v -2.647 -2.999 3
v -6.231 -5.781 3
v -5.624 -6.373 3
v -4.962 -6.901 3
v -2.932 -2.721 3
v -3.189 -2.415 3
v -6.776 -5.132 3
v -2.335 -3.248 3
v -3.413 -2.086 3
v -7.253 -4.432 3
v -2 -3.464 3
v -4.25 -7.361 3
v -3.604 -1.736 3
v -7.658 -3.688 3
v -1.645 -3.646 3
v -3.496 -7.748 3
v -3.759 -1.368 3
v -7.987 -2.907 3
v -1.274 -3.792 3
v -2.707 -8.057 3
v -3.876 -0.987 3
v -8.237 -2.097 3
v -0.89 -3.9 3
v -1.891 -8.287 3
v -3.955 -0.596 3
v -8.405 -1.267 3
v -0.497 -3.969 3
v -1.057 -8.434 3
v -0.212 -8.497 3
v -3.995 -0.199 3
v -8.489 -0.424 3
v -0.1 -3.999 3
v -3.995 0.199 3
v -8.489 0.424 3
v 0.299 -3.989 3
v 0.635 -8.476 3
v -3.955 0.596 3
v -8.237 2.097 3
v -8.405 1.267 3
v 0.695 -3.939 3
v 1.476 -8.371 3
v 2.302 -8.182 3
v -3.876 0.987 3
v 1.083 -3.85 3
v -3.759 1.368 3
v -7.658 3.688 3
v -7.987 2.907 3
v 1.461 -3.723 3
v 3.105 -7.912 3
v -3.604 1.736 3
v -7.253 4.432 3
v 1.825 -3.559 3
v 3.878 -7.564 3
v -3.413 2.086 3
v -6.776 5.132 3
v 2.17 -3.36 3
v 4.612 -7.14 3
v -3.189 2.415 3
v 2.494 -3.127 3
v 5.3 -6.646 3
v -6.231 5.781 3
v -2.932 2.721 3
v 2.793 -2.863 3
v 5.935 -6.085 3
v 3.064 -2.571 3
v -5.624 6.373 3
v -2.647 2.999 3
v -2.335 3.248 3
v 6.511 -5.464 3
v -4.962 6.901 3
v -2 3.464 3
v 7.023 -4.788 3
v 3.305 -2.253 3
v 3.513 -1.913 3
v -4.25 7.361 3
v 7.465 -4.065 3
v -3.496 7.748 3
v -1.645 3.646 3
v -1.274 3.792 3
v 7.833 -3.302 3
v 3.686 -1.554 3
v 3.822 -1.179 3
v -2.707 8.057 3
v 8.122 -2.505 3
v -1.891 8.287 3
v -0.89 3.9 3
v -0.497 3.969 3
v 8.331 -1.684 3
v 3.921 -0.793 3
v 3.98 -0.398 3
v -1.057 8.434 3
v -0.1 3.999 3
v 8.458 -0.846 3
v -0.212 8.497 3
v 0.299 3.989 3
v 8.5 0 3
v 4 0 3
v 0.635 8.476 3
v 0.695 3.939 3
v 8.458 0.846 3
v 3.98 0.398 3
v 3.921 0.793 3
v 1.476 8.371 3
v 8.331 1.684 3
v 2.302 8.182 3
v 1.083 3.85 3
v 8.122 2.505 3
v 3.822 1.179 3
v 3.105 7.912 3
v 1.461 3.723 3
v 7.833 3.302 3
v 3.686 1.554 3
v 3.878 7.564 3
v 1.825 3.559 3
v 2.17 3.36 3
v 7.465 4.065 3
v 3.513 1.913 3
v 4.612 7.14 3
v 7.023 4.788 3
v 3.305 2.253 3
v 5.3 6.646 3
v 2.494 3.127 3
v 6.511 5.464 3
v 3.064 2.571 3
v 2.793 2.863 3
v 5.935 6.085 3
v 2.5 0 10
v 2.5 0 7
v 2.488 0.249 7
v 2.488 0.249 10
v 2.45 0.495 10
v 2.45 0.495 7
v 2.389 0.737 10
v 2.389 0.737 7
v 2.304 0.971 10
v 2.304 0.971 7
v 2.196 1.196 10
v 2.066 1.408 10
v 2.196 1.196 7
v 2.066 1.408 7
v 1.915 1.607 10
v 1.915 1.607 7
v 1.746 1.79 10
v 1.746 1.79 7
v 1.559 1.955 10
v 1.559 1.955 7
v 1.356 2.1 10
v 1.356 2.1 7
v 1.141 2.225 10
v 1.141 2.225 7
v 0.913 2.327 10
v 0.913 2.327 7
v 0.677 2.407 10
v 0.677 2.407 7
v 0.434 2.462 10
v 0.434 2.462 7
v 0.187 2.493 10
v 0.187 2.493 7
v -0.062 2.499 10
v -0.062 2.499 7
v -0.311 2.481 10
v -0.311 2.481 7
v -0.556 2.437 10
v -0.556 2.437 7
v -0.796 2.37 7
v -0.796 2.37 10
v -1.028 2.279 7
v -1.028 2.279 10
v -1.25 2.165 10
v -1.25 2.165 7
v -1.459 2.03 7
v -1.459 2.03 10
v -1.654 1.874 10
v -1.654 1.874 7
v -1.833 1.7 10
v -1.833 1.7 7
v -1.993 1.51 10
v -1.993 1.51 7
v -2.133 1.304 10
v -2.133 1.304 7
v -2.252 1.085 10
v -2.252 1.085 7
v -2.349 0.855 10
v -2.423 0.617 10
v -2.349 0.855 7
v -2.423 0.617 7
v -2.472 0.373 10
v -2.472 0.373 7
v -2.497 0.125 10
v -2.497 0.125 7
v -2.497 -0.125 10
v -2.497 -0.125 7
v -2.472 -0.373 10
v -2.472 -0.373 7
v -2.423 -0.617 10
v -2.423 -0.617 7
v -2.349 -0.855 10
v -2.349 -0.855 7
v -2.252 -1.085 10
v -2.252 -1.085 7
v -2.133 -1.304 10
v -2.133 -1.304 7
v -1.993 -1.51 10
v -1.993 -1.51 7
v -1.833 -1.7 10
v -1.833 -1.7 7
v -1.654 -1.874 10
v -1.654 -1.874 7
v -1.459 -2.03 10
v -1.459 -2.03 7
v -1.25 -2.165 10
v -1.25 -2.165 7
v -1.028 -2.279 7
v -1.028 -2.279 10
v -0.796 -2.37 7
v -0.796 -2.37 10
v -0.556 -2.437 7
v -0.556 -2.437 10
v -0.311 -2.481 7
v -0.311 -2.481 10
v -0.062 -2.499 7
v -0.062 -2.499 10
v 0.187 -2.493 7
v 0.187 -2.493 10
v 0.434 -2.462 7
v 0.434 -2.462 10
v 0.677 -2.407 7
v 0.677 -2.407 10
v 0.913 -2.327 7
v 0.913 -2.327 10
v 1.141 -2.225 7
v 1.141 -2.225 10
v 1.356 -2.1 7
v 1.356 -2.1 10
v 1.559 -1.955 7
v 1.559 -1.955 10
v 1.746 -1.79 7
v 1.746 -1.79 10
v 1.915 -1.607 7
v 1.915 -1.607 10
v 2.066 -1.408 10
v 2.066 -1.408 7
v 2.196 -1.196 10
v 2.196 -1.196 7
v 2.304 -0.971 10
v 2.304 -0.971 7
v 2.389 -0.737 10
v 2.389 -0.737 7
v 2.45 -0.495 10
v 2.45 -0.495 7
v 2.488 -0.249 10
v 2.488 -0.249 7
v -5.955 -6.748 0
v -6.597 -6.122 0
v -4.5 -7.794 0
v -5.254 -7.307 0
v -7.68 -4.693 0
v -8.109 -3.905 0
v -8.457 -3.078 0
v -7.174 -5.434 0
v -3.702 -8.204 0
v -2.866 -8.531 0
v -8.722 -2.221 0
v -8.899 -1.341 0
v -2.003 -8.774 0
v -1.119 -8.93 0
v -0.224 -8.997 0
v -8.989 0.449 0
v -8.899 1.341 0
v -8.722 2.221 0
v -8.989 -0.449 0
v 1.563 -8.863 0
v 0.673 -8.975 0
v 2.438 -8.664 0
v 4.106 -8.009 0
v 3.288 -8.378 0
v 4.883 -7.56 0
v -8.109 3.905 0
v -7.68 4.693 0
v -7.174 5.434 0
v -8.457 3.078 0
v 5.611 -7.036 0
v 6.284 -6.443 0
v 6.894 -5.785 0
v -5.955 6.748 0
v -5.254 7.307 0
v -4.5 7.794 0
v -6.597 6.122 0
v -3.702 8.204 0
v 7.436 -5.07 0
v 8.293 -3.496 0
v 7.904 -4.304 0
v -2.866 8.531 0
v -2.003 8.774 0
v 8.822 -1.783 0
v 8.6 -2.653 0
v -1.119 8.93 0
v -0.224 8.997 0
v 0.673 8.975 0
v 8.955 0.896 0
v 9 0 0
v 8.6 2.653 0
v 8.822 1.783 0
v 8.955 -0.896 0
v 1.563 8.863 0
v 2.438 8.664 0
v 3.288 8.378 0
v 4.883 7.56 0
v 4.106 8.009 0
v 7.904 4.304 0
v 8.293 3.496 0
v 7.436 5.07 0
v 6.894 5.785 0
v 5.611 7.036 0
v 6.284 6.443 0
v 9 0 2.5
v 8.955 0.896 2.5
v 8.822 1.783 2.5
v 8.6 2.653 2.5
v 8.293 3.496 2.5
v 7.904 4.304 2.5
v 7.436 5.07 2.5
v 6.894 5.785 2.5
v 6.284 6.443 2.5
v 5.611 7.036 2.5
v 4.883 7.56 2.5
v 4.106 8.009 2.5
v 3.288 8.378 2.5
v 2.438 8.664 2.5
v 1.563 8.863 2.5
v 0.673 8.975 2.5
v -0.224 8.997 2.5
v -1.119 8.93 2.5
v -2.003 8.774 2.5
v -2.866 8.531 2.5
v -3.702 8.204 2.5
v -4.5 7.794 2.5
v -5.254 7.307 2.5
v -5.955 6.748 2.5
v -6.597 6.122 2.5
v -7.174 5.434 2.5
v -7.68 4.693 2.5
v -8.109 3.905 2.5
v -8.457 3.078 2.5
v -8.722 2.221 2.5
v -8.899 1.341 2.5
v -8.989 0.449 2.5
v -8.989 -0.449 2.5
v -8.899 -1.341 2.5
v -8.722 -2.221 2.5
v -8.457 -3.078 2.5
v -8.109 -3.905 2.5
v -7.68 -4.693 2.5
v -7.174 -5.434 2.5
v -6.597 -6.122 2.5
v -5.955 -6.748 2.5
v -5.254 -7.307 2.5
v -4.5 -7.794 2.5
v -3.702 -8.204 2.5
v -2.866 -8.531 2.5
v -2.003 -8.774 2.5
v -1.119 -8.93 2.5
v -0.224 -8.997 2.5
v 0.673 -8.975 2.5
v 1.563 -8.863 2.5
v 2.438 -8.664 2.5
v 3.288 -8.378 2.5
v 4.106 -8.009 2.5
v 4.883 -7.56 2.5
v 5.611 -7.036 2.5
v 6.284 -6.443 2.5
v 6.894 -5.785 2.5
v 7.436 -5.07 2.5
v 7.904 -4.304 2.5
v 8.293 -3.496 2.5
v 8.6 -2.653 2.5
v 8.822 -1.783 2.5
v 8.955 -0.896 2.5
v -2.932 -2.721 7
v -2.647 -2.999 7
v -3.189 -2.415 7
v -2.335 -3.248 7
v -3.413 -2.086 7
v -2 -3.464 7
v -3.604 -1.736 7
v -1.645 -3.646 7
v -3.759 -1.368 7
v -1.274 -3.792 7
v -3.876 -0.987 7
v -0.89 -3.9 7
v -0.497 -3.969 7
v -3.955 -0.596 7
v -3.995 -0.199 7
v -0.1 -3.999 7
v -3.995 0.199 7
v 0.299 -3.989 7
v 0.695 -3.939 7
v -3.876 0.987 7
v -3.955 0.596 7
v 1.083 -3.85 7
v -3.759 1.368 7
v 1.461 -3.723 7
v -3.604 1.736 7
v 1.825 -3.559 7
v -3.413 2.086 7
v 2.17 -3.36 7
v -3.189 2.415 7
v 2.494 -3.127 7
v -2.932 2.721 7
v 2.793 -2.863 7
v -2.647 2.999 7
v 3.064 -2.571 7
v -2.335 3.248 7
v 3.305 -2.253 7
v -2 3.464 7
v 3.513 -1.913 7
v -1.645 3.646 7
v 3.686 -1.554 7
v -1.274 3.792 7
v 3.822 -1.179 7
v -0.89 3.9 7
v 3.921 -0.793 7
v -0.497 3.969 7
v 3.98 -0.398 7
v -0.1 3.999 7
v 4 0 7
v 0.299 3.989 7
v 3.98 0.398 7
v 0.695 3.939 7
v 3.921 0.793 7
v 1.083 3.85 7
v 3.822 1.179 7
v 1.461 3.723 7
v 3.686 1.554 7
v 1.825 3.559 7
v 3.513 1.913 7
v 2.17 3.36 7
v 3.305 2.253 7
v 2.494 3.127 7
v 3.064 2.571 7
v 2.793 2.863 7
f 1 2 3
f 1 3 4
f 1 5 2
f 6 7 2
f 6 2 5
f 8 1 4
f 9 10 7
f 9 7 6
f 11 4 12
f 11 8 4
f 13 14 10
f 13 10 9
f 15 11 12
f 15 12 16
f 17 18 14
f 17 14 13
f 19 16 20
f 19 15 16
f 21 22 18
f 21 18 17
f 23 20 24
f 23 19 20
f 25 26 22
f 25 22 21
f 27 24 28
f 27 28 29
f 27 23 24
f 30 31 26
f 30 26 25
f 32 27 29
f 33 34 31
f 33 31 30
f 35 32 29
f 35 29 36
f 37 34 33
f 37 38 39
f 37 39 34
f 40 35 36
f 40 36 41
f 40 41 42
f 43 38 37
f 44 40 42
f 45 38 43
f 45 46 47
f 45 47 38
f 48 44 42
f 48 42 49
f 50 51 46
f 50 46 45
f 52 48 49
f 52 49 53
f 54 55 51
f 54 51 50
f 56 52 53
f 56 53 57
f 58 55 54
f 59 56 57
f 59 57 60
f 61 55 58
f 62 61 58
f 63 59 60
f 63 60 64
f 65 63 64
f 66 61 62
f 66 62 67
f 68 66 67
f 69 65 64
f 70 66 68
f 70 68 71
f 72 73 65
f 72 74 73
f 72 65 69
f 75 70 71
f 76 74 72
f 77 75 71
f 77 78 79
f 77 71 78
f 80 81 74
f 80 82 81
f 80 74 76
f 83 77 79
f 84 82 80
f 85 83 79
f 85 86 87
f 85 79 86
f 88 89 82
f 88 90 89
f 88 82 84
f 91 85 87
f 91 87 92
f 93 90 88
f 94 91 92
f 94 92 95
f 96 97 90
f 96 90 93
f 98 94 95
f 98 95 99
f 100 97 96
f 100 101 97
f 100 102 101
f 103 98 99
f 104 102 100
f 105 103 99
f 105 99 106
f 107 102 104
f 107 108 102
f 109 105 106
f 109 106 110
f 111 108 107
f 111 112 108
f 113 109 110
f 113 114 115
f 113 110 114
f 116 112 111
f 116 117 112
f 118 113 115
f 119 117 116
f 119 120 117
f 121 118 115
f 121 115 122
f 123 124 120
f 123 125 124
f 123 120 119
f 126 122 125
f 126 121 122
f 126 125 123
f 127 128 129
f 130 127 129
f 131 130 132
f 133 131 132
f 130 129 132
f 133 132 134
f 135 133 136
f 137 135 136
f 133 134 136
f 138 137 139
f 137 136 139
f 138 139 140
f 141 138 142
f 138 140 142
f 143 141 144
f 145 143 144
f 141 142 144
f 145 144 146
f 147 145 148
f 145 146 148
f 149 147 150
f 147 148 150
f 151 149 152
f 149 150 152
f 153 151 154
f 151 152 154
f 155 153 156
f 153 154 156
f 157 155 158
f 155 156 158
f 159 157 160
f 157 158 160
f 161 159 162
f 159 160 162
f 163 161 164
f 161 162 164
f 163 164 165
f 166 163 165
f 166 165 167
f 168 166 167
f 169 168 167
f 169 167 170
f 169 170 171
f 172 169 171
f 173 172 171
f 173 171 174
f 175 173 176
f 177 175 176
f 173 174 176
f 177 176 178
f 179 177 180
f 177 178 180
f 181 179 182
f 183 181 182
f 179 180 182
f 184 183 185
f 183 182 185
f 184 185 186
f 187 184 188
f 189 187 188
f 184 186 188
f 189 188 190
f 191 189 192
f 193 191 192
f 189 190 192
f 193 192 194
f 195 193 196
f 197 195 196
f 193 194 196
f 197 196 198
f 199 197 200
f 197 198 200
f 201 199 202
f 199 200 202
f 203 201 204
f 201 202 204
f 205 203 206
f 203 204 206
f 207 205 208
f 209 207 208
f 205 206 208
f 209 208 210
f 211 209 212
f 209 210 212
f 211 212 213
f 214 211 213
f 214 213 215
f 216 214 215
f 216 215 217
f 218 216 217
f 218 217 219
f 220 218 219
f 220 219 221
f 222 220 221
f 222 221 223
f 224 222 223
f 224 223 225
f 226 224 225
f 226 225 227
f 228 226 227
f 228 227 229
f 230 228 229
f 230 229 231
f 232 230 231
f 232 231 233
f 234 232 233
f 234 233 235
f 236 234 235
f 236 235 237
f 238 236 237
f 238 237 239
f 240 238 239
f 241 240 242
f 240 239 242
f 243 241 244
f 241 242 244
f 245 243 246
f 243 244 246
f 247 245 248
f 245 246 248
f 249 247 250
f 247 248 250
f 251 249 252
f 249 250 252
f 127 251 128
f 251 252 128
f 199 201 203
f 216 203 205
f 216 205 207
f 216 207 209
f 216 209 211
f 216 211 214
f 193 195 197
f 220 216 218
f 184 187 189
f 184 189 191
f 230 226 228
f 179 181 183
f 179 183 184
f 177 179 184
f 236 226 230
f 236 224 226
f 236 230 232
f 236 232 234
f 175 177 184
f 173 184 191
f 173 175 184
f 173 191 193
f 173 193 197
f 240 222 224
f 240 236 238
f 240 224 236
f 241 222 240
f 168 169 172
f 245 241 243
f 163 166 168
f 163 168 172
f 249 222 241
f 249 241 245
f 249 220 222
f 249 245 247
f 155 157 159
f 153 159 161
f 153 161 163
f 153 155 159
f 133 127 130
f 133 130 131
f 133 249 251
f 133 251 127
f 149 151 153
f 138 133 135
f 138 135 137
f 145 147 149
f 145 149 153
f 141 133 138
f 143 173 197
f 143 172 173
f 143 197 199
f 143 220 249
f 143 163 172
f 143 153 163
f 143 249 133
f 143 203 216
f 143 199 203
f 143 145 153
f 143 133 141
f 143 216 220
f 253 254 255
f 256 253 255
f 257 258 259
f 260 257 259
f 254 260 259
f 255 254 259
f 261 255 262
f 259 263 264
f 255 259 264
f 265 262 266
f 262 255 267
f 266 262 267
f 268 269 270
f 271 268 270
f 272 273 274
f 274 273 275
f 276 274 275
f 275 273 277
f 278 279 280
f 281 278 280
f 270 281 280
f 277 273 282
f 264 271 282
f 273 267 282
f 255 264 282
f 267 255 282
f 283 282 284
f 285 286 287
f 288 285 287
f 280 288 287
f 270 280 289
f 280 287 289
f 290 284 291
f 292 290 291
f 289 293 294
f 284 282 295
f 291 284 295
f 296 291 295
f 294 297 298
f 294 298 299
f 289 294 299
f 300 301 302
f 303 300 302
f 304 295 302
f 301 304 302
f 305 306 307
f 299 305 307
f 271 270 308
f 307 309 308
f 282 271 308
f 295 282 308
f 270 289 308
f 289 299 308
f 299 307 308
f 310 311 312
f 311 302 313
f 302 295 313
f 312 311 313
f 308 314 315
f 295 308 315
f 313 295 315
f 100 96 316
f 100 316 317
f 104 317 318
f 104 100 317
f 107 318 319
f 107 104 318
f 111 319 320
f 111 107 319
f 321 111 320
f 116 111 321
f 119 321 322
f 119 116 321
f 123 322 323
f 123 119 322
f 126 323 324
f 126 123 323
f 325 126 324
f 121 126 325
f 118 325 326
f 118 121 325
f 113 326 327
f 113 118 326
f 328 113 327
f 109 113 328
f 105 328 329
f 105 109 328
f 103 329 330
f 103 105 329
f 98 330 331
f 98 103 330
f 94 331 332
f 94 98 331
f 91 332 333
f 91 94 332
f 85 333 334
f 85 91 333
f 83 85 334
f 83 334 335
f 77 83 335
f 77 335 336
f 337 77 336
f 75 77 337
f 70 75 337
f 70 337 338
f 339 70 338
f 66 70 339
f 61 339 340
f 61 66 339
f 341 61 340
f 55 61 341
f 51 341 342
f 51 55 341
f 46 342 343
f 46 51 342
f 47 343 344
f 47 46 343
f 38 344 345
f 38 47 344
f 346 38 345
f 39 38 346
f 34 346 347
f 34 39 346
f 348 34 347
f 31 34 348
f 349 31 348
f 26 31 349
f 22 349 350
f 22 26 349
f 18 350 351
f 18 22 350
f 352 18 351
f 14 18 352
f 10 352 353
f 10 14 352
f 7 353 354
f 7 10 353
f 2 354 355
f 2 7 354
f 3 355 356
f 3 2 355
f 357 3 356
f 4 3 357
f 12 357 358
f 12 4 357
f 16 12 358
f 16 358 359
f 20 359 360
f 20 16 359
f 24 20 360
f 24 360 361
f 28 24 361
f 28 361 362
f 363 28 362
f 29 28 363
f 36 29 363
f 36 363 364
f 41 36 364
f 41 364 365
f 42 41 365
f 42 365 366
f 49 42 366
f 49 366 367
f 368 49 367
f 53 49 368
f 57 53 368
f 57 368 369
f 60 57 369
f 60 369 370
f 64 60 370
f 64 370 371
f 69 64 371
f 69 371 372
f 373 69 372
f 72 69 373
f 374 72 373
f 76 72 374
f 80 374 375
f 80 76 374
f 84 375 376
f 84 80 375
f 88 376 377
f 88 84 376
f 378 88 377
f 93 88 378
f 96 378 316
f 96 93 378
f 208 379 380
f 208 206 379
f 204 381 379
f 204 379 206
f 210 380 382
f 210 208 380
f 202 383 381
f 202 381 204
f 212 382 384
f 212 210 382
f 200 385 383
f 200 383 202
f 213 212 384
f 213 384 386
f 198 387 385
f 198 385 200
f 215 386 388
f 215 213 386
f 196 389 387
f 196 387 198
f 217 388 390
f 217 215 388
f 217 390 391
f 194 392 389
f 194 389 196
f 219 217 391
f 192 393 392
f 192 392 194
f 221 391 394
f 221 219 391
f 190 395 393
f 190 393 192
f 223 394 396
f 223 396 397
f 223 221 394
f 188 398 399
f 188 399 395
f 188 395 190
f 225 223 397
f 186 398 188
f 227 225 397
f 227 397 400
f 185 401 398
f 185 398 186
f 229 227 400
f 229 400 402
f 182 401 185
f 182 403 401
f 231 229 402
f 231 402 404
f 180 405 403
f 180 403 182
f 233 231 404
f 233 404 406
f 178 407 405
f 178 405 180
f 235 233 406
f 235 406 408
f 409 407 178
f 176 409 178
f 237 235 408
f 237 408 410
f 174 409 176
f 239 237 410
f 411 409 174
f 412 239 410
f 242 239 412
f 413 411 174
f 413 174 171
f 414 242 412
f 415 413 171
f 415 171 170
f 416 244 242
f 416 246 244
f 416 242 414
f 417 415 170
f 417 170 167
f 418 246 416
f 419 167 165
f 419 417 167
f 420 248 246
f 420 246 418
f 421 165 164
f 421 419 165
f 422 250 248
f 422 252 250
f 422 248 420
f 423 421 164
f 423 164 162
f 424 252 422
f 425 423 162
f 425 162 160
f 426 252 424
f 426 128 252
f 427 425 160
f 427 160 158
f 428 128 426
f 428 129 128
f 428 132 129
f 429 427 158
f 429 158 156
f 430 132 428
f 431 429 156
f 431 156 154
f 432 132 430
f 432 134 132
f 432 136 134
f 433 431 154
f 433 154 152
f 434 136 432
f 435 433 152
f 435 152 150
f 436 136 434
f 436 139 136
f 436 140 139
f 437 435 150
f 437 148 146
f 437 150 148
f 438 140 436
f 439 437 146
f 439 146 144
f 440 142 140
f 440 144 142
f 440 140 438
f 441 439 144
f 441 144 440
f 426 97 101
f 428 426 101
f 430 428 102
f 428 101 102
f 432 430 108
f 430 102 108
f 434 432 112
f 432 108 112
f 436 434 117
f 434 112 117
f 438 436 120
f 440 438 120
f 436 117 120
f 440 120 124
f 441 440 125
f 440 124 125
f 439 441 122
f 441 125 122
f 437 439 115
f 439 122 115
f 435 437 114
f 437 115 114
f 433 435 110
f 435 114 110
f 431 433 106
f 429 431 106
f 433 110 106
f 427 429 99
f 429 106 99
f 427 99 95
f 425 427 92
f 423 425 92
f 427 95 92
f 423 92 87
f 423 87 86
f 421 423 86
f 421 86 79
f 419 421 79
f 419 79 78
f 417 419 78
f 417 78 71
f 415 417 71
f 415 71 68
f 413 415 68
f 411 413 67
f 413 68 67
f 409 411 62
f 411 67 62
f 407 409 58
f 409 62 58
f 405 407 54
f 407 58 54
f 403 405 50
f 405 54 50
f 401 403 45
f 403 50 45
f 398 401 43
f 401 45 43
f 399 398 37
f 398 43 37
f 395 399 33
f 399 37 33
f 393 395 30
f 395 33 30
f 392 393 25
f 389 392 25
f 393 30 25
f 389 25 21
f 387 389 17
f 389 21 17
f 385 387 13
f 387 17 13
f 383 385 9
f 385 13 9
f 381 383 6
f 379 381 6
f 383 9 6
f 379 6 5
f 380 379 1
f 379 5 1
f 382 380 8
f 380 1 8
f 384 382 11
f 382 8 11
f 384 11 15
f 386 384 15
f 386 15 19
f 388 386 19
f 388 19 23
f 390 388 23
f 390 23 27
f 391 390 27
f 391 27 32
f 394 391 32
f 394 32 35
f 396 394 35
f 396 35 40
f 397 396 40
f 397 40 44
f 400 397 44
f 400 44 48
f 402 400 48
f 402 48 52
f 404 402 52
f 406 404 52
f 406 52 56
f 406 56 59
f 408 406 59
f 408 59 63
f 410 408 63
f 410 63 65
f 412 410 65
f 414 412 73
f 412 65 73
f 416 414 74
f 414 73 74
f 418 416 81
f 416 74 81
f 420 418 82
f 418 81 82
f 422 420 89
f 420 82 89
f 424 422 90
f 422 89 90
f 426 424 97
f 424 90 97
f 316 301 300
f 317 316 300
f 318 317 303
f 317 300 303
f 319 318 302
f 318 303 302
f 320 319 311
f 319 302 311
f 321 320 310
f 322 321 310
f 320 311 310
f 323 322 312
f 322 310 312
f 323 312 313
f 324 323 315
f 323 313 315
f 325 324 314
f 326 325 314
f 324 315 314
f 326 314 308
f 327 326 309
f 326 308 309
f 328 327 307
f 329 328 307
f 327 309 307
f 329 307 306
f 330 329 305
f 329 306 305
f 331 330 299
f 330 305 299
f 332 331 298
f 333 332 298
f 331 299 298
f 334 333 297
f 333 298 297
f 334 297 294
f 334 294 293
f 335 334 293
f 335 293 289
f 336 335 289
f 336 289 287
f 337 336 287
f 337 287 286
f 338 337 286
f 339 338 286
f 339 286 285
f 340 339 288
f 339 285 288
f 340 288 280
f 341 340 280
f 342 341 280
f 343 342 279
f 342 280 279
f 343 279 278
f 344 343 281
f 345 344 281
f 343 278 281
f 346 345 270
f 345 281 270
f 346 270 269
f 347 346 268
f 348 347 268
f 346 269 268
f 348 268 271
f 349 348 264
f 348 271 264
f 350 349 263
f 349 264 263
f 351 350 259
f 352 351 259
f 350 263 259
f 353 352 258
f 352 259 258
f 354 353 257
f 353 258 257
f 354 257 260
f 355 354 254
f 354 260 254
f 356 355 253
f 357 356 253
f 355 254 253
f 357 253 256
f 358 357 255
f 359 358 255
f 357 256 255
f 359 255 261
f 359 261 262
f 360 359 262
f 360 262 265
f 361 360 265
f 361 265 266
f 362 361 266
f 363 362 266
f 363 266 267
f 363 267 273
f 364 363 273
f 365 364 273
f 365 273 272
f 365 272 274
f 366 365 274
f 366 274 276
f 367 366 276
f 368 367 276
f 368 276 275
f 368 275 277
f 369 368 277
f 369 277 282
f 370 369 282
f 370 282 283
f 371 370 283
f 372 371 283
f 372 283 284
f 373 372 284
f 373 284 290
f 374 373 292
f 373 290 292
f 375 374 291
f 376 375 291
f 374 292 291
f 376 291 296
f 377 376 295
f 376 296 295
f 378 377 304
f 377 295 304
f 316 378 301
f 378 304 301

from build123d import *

# Parameters (mm, degrees)
F0_R     = 9
F1_DEPTH = 3
F2_SIZE  = 0.5
F3_R     = 4
F4_DEPTH = 4
F5_R     = 2.5
F6_DEPTH = 3


with BuildPart() as f1:
    # F0 (on Top) → F1 (new body)
    with BuildSketch(Plane.XY):
        Circle(F0_R)
    extrude(amount=F1_DEPTH)

    # F2
    f2_edges = [f1.edges().sort_by_distance(p)[0] for p in [
        (-9, 0, 3),
    ]]
    chamfer(f2_edges, length=F2_SIZE)

    # F3 (on face) → F4 (join)
    with BuildSketch(Plane.XY.offset(3)):
        Circle(F3_R)
    extrude(amount=F4_DEPTH)

    # F5 (on face) → F6 (join)
    with BuildSketch(Plane.XY.offset(7)):
        Circle(F5_R)
    extrude(amount=F6_DEPTH)


solid = f1.part
